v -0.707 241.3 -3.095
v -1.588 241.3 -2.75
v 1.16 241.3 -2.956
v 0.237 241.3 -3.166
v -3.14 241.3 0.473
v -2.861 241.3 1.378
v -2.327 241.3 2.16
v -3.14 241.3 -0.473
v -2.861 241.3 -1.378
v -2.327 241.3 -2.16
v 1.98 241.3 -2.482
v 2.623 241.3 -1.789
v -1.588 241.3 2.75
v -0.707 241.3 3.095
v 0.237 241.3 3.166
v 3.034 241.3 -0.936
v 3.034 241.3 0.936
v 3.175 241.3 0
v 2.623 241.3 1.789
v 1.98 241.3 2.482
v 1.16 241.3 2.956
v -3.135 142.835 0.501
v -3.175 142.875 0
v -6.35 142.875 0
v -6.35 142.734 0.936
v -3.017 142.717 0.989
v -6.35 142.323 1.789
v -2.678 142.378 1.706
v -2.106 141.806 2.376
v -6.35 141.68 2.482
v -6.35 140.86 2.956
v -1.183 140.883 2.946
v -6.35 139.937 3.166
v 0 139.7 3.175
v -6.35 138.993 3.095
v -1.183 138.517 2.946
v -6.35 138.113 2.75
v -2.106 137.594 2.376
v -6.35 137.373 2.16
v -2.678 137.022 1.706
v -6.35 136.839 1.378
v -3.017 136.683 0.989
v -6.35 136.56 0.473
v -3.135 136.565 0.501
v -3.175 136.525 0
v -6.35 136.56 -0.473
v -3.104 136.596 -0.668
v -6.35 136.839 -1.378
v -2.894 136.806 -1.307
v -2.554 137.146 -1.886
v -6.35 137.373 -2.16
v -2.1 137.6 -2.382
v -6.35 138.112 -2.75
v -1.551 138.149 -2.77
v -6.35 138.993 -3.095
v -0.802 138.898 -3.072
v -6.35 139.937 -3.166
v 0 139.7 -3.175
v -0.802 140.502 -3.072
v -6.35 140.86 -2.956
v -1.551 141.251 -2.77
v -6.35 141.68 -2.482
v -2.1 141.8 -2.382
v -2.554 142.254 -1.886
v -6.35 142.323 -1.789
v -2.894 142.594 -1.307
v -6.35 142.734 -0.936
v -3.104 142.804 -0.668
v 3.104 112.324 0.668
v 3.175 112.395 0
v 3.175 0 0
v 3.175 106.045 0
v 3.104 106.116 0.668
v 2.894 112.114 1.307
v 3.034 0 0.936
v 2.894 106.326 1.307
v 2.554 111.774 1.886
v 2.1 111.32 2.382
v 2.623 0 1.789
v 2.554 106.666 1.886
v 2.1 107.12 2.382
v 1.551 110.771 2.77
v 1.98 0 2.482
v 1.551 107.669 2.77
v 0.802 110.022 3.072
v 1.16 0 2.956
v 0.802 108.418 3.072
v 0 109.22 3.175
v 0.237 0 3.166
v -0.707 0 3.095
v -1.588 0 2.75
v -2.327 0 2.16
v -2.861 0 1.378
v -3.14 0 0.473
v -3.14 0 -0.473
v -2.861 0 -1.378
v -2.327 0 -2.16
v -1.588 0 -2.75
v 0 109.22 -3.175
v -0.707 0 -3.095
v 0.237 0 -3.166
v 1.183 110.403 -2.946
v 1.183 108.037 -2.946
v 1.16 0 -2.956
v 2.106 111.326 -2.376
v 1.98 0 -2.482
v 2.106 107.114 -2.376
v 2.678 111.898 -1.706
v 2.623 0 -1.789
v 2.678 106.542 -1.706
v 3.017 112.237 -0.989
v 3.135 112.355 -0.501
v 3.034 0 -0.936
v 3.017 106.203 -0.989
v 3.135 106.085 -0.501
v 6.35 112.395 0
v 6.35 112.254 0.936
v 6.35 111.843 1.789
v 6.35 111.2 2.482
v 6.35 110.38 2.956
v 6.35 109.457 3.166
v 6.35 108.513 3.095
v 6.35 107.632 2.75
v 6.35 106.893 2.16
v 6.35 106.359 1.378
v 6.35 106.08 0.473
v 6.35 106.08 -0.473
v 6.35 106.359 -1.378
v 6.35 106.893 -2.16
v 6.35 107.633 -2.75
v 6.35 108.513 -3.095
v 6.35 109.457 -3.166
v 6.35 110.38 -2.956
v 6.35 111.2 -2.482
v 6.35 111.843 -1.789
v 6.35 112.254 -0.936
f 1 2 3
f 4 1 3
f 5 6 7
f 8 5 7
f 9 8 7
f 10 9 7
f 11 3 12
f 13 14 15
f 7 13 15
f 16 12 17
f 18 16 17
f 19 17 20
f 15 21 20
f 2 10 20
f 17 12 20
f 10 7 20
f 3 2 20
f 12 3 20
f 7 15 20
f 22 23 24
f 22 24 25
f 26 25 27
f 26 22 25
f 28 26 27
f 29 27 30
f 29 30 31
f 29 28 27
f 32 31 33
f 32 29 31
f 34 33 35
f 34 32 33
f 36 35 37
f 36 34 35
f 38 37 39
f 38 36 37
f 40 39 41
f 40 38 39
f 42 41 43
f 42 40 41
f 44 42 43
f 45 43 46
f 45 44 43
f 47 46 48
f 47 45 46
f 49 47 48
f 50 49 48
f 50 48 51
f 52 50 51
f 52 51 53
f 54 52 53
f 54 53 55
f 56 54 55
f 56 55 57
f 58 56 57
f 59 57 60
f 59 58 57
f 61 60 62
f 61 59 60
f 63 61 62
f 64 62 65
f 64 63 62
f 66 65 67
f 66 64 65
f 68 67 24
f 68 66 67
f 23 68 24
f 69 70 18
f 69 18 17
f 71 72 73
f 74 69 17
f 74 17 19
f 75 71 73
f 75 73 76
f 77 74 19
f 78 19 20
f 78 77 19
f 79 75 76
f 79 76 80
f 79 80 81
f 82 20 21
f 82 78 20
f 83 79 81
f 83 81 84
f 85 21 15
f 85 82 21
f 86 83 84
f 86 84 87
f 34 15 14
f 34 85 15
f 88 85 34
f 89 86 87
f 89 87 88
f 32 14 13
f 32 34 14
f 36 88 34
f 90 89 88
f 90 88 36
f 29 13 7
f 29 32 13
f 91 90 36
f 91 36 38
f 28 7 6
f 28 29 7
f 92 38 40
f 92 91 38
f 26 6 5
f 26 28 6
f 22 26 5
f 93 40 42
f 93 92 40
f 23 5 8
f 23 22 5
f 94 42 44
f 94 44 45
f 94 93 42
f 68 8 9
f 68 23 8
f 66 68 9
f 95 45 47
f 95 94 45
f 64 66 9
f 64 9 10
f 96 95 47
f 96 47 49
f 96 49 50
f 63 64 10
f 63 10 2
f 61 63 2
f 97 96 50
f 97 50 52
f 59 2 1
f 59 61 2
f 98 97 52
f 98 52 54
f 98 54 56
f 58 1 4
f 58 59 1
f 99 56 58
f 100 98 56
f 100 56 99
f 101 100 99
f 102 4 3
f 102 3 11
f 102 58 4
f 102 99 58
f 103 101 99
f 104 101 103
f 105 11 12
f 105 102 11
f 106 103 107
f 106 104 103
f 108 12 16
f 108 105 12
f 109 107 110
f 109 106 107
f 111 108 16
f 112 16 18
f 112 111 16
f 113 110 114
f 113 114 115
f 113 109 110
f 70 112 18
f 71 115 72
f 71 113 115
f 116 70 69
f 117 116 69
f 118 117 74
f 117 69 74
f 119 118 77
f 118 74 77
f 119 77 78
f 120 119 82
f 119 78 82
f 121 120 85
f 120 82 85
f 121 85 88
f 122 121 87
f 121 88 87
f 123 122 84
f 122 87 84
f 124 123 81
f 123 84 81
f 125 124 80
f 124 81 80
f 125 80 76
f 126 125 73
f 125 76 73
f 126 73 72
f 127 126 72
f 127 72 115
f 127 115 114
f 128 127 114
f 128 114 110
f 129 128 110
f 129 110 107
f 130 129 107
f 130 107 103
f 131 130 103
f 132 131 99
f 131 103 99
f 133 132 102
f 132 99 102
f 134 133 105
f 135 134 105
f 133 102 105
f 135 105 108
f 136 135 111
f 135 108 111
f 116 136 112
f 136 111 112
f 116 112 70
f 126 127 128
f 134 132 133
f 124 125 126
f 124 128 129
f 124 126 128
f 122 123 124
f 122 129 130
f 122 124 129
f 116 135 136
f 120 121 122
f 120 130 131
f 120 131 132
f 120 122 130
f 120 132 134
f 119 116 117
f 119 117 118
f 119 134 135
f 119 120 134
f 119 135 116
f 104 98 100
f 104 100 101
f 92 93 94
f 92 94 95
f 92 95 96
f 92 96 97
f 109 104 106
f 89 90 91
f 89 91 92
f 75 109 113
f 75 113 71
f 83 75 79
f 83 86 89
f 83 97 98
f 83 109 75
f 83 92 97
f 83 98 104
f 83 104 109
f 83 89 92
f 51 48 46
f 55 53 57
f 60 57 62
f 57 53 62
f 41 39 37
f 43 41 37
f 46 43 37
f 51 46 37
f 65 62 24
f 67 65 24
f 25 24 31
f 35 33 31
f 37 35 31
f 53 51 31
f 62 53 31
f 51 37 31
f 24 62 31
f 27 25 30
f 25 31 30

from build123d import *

# Parameters (mm, degrees)
F0_R     = 3.175
F1_DEPTH = 241.3
F4_DEPTH = 6.35
F6_DEPTH = 6.35


with BuildPart() as f1:
    # F0 (on Front) → F1 (new body)
    with BuildSketch(Plane.XZ):
        Circle(F0_R)
    extrude(amount=-F1_DEPTH)

    # F3 (on Right) → F4 (join)
    with BuildSketch(Plane.YZ):
        with BuildLine():
            ThreePointArc((106.045, 0), (109.22, -3.175), (112.395, 0))
            Line((112.395, 0), (106.045, 0))
        make_face()
        with BuildLine():
            Line((106.045, 0), (112.395, 0))
            ThreePointArc((112.395, 0), (109.22, 3.175), (106.045, 0))
        make_face()
    extrude(amount=F4_DEPTH)

    # F5 (on Right) → F6 (join)
    with BuildSketch(Plane.YZ):
        with BuildLine():
            ThreePointArc((136.525, 0), (139.7, -3.175), (142.875, 0))
            Line((142.875, 0), (136.525, 0))
        make_face()
        with BuildLine():
            Line((136.525, 0), (142.875, 0))
            ThreePointArc((142.875, 0), (139.7, 3.175), (136.525, 0))
        make_face()
    extrude(amount=-F6_DEPTH)


solid = f1.part
